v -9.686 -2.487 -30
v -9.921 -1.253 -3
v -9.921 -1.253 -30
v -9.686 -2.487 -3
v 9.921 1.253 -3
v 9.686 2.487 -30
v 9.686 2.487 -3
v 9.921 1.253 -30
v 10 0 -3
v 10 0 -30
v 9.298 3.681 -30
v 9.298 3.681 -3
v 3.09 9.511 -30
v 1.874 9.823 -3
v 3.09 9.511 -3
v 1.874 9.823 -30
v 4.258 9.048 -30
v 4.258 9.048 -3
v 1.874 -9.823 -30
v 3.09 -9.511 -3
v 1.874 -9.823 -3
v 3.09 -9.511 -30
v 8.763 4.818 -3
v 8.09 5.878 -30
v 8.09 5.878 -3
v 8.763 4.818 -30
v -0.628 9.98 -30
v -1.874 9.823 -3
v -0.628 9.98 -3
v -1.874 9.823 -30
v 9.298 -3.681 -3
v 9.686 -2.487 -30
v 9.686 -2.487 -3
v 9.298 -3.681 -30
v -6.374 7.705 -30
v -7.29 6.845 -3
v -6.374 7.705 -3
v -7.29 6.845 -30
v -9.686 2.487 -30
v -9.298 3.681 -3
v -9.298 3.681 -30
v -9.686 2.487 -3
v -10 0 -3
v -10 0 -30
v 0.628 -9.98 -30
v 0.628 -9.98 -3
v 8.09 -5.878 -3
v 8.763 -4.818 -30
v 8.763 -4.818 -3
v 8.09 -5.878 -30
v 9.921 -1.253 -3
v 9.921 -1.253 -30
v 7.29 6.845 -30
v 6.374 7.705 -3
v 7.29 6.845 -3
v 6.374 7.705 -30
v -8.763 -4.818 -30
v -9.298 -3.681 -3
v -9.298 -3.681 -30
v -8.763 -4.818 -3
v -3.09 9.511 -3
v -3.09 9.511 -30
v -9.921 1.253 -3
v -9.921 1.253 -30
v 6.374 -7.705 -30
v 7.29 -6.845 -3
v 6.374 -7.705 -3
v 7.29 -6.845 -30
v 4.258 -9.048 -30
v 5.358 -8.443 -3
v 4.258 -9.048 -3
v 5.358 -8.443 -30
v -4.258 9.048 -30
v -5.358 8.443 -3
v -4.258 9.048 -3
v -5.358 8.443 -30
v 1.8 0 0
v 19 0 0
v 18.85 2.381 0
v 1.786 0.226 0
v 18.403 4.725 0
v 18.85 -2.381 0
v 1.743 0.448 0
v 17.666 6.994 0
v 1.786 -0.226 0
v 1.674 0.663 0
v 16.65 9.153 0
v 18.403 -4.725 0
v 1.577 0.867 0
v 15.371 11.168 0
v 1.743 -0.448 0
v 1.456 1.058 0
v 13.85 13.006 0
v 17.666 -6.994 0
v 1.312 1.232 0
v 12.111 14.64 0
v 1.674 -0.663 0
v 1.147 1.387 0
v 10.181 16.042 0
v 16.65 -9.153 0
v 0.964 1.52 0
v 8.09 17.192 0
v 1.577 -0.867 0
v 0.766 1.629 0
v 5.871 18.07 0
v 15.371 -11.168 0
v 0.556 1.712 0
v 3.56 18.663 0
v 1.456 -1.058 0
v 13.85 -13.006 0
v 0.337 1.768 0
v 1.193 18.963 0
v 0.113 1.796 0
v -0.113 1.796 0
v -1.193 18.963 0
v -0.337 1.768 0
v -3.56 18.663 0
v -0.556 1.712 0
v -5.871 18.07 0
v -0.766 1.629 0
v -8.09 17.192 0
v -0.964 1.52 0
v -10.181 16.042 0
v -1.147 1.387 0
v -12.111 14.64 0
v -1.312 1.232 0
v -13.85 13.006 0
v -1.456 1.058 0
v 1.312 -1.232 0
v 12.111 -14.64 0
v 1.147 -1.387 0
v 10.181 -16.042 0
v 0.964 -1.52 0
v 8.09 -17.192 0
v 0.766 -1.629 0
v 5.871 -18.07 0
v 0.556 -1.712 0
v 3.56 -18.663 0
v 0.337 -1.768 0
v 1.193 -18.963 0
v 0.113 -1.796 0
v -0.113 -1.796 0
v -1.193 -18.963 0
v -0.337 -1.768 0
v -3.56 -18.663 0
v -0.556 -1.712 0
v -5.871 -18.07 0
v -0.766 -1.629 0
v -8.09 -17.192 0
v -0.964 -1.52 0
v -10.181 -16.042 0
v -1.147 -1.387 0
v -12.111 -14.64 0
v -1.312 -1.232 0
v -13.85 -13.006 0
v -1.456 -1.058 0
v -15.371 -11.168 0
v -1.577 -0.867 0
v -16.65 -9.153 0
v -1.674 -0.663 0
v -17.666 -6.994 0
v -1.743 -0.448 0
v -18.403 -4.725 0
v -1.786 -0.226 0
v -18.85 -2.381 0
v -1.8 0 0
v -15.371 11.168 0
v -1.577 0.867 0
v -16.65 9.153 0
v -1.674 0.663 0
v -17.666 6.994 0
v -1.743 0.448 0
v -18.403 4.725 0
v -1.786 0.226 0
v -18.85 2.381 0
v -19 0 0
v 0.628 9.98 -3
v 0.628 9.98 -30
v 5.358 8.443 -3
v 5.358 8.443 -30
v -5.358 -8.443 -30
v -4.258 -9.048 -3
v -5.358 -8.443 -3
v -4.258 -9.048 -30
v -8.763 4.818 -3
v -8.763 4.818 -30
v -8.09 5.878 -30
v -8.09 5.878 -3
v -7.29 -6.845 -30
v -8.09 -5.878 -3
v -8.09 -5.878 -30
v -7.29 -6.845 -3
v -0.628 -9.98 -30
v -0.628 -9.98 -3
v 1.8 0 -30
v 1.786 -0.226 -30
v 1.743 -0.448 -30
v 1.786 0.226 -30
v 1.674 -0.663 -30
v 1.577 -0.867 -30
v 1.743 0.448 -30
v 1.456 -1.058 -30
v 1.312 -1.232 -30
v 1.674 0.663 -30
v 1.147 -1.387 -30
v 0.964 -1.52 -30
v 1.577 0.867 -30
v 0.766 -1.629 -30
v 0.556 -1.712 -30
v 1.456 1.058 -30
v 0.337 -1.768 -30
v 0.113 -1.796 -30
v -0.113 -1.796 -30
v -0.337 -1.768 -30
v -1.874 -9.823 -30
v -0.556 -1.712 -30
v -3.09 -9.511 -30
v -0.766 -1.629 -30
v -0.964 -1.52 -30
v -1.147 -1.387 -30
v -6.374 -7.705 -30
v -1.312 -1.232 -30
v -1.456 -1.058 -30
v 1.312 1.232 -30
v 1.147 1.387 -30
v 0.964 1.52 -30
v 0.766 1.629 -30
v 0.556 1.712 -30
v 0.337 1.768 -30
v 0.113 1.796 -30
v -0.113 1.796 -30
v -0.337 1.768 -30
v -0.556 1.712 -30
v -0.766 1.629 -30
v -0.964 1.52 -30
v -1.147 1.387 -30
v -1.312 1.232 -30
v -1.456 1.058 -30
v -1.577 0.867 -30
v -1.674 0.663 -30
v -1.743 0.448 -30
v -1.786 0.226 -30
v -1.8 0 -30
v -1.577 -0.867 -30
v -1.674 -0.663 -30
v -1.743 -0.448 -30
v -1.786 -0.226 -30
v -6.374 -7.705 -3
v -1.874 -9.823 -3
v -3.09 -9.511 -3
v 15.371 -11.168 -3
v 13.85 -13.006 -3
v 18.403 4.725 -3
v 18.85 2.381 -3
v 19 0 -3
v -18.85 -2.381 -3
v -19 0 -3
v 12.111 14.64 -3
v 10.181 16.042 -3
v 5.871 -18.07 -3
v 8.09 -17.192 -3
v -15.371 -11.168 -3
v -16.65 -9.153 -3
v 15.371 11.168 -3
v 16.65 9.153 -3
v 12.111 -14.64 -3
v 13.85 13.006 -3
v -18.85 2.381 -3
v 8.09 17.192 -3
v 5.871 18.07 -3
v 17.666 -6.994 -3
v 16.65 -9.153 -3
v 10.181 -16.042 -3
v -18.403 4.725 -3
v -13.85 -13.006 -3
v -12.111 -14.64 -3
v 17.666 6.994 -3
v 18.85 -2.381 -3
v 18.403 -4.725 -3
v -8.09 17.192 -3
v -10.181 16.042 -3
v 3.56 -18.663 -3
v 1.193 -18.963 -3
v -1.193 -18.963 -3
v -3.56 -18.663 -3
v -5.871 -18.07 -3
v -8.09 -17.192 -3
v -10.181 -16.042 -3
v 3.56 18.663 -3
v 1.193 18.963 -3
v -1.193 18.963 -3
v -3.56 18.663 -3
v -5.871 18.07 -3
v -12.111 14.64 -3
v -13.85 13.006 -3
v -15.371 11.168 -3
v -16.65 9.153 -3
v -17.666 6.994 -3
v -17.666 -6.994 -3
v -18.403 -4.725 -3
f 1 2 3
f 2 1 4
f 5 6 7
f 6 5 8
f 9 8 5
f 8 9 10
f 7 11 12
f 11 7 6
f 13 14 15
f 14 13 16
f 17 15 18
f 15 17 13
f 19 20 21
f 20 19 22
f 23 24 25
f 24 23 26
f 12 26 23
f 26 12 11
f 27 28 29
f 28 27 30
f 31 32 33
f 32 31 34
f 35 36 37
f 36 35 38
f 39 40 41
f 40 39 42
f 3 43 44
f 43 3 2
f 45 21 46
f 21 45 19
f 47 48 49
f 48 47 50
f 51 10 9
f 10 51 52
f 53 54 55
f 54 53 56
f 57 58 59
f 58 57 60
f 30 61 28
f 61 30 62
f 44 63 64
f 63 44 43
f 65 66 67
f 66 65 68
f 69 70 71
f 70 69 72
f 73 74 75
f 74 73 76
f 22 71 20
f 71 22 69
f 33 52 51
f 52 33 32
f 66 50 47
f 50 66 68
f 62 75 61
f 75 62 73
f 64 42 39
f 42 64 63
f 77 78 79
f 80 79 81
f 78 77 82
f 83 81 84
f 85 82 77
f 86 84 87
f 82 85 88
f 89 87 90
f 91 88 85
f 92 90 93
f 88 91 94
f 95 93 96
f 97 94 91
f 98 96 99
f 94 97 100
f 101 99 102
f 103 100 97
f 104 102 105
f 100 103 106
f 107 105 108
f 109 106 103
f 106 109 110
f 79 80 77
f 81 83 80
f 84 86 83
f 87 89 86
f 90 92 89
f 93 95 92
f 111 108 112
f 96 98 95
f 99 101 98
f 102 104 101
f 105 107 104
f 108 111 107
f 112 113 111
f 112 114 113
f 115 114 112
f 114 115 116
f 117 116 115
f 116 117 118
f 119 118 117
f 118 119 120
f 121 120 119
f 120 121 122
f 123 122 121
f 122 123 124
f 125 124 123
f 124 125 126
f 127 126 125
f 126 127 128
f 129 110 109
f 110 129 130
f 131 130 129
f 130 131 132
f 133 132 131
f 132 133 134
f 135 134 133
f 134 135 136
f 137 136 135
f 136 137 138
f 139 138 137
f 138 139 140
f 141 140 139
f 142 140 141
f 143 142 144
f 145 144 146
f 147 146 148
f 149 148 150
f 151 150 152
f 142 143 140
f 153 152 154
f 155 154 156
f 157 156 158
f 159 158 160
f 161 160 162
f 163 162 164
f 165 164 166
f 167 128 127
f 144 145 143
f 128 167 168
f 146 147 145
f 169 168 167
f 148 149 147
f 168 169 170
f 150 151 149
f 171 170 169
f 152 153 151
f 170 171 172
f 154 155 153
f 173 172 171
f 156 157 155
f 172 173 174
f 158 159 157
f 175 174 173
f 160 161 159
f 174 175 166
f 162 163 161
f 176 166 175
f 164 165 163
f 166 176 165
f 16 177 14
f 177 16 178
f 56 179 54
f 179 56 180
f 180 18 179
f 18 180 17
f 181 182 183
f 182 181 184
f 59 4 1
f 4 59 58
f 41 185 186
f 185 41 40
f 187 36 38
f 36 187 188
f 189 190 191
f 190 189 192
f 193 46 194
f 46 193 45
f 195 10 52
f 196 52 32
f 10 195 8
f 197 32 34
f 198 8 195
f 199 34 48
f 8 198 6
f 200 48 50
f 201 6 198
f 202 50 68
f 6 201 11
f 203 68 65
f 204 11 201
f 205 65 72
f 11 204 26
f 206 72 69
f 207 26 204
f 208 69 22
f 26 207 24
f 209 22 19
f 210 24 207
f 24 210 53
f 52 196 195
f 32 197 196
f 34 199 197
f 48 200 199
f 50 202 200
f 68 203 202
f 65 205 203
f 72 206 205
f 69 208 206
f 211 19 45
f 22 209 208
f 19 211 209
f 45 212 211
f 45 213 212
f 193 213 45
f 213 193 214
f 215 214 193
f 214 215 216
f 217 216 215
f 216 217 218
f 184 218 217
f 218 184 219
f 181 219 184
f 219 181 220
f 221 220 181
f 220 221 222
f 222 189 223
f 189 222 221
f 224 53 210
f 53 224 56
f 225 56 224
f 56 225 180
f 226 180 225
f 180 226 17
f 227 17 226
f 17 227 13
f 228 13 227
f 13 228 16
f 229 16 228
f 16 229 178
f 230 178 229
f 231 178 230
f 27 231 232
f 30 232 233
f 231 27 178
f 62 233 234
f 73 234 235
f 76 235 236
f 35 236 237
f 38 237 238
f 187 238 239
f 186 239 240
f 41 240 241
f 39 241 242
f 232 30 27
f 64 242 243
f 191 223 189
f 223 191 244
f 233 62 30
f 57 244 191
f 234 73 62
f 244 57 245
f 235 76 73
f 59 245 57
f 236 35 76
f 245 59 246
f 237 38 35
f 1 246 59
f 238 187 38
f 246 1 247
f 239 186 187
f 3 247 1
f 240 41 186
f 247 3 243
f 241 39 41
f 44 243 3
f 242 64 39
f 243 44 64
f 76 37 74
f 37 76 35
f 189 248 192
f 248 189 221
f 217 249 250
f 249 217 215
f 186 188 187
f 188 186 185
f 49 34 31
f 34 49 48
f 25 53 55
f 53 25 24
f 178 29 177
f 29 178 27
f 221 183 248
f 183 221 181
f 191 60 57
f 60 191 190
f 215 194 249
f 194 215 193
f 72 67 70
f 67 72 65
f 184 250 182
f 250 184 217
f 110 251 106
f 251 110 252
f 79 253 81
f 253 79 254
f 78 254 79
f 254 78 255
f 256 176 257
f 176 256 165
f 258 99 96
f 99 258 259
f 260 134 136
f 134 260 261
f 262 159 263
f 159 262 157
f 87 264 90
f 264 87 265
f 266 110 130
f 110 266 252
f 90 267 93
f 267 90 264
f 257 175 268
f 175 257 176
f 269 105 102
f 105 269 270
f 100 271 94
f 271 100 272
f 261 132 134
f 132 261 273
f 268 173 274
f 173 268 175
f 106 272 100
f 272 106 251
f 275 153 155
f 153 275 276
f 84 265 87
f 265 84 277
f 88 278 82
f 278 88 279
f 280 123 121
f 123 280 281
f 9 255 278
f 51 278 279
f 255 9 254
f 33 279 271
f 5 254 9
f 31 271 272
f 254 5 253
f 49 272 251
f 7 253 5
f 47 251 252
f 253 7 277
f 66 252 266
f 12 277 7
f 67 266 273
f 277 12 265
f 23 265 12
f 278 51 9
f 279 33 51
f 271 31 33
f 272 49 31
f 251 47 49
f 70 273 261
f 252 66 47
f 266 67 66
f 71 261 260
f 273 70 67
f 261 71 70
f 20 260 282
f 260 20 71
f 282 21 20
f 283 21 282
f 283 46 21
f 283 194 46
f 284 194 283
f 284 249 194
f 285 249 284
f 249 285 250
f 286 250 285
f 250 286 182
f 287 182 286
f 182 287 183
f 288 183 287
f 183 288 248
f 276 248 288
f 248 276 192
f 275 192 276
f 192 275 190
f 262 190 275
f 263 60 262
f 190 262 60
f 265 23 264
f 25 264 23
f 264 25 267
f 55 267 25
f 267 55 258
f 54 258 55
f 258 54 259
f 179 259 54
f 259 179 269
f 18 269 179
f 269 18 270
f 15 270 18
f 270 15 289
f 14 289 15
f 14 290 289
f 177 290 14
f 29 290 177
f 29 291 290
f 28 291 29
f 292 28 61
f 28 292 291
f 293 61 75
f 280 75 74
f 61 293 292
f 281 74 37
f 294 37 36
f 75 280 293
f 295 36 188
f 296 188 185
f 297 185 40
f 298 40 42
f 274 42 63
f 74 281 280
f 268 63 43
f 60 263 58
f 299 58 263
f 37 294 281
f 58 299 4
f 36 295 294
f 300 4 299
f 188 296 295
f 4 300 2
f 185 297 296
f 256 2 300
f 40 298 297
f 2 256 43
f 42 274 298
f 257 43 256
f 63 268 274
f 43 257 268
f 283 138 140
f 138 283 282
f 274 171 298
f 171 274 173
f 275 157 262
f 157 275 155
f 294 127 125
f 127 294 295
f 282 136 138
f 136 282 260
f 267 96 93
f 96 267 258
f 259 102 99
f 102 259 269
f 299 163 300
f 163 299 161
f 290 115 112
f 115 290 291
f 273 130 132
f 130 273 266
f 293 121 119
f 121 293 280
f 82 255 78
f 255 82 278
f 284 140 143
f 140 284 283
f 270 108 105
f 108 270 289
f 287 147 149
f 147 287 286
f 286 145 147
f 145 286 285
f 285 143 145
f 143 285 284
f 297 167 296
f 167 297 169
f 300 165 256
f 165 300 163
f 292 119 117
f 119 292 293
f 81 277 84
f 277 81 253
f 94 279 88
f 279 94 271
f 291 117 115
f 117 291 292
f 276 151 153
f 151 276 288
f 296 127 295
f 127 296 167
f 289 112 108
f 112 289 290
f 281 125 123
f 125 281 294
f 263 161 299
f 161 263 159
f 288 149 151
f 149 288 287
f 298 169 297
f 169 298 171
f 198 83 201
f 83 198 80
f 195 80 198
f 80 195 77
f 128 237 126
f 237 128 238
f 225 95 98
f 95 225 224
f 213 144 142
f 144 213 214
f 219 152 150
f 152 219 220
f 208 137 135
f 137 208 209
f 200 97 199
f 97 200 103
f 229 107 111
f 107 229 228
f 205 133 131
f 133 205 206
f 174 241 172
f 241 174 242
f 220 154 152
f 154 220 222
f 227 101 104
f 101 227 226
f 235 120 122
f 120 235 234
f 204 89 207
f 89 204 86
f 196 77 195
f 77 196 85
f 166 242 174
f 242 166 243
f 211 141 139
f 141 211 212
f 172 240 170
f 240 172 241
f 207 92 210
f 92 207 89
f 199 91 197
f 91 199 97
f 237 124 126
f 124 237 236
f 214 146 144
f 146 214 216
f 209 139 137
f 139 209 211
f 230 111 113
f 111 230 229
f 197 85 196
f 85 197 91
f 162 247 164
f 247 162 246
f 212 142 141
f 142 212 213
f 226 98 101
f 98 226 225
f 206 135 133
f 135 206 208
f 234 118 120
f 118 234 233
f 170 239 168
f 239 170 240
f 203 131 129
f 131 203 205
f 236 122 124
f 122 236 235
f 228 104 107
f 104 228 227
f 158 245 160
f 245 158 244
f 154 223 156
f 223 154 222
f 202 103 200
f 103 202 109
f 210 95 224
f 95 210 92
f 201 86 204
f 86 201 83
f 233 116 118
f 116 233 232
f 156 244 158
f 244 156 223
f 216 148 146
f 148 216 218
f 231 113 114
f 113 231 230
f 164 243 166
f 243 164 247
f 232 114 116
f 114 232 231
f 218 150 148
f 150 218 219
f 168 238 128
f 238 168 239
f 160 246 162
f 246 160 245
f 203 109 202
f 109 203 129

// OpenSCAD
$fn = 50;


difference() {
	union() {
		translate(v = [0, 0, -30.0000000000]) {
			cylinder(h = 30, r = 10.0000000000);
		}
		translate(v = [0, 0, -3.0000000000]) {
			cylinder(h = 3, r = 19.0000000000);
		}
	}
	union() {
		#translate(v = [0, 0, -30]) {
			cylinder(h = 30, r = 1.8000000000);
		}
	}
}
